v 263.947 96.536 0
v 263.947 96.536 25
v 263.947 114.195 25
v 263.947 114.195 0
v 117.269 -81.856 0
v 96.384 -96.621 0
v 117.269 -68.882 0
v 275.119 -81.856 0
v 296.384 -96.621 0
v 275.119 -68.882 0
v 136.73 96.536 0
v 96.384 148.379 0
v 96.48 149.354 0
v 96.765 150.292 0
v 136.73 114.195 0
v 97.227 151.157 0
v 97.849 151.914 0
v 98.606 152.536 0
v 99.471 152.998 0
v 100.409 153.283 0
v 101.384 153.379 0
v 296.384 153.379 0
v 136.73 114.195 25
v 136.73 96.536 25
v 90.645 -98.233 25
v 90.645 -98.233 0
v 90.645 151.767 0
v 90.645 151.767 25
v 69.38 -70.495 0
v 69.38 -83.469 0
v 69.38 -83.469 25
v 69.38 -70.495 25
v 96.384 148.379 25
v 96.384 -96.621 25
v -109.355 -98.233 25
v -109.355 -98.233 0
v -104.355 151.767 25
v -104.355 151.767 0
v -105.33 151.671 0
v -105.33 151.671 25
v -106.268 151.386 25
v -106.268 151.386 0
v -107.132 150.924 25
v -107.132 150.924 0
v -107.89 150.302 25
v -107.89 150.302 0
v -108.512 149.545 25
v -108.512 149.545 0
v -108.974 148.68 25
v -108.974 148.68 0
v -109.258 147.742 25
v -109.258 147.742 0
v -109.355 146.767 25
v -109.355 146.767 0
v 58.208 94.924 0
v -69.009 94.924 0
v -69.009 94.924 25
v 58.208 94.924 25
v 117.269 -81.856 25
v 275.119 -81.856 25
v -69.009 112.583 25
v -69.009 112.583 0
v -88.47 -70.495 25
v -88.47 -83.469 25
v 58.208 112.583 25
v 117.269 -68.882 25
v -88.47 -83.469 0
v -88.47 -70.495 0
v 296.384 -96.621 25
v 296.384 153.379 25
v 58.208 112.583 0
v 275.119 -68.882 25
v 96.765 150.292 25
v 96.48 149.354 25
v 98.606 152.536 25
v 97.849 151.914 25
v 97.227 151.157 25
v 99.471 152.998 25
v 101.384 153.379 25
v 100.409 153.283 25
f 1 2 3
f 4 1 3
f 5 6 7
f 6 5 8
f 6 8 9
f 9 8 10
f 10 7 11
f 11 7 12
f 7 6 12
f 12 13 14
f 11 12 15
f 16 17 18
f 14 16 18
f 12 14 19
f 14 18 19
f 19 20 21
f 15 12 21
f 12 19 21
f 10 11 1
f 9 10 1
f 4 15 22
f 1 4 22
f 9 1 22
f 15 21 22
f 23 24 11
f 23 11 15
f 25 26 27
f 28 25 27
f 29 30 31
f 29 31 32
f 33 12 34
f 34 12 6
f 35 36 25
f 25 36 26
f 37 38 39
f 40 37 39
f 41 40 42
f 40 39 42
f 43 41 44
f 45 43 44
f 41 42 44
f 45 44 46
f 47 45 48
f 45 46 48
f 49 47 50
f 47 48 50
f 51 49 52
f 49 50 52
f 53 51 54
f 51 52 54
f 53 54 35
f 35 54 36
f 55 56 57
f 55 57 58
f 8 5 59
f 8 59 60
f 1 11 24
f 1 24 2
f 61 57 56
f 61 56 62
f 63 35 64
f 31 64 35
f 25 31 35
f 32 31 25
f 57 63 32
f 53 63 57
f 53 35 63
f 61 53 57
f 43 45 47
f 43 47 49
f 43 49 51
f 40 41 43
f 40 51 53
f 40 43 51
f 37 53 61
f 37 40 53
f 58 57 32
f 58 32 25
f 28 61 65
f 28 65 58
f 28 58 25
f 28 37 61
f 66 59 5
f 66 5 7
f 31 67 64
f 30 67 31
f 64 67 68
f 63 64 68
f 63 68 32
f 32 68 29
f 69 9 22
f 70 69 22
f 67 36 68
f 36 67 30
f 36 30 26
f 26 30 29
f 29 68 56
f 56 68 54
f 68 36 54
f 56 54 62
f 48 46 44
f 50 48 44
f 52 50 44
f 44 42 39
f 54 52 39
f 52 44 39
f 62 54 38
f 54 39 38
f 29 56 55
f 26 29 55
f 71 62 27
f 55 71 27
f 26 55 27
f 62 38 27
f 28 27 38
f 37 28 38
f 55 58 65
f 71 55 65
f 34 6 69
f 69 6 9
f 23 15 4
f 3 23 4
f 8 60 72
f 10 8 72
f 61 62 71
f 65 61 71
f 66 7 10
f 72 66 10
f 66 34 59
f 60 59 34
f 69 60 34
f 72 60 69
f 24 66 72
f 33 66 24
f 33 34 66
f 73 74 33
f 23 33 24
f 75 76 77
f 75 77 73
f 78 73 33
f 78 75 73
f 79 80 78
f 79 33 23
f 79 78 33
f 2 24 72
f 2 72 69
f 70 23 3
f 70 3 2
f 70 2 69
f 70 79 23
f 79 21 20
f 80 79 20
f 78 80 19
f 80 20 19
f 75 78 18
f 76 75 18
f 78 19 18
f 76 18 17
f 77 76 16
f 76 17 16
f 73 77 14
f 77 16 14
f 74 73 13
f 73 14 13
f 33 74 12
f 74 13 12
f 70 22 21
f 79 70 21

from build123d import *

# Parameters (mm, degrees)
F0_W     = 157.850109
F0_H     = 12.973979
F0_W_2   = 127.217107
F0_H_2   = 17.659031
F0_H_3   = 12.97398
F0_W_3   = 127.217106
F1_DEPTH = 25


with BuildPart() as f1:
    # F0 (on Top) → F1 (new body)
    with BuildSketch(Plane.XY):
        with BuildLine():
            Line((296.384121, 153.378814), (101.384121, 153.378814))
            ThreePointArc((101.384121, 153.378814), (97.848587, 151.914348), (96.384121, 148.378814))
            Line((96.384121, 148.378814), (96.384121, -96.621186))
            Line((96.384121, -96.621186), (296.384121, -96.621186))
            Line((296.384121, -96.621186), (296.384121, 153.378814))
        make_face()
        with Locations((196.193724, -75.369484)):
            Rectangle(F0_W, F0_H, mode=Mode.SUBTRACT)
        with Locations((200.338191, 105.365296)):
            Rectangle(F0_W_2, F0_H_2, mode=Mode.SUBTRACT)
        with BuildLine():
            Line((90.645454, 151.766678), (-104.354546, 151.766678))
            ThreePointArc((-104.354546, 151.766678), (-107.89008, 150.302212), (-109.354546, 146.766678))
            Line((-109.354546, 146.766678), (-109.354546, -98.233322))
            Line((-109.354546, -98.233322), (90.645454, -98.233322))
            Line((90.645454, -98.233322), (90.645454, 151.766678))
        make_face()
        with Locations((-9.544942, -76.981619)):
            Rectangle(F0_W, F0_H_3, mode=Mode.SUBTRACT)
        with Locations((-5.400475, 103.75316)):
            Rectangle(F0_W_3, F0_H_2, mode=Mode.SUBTRACT)
    extrude(amount=F1_DEPTH)


solid = f1.part
